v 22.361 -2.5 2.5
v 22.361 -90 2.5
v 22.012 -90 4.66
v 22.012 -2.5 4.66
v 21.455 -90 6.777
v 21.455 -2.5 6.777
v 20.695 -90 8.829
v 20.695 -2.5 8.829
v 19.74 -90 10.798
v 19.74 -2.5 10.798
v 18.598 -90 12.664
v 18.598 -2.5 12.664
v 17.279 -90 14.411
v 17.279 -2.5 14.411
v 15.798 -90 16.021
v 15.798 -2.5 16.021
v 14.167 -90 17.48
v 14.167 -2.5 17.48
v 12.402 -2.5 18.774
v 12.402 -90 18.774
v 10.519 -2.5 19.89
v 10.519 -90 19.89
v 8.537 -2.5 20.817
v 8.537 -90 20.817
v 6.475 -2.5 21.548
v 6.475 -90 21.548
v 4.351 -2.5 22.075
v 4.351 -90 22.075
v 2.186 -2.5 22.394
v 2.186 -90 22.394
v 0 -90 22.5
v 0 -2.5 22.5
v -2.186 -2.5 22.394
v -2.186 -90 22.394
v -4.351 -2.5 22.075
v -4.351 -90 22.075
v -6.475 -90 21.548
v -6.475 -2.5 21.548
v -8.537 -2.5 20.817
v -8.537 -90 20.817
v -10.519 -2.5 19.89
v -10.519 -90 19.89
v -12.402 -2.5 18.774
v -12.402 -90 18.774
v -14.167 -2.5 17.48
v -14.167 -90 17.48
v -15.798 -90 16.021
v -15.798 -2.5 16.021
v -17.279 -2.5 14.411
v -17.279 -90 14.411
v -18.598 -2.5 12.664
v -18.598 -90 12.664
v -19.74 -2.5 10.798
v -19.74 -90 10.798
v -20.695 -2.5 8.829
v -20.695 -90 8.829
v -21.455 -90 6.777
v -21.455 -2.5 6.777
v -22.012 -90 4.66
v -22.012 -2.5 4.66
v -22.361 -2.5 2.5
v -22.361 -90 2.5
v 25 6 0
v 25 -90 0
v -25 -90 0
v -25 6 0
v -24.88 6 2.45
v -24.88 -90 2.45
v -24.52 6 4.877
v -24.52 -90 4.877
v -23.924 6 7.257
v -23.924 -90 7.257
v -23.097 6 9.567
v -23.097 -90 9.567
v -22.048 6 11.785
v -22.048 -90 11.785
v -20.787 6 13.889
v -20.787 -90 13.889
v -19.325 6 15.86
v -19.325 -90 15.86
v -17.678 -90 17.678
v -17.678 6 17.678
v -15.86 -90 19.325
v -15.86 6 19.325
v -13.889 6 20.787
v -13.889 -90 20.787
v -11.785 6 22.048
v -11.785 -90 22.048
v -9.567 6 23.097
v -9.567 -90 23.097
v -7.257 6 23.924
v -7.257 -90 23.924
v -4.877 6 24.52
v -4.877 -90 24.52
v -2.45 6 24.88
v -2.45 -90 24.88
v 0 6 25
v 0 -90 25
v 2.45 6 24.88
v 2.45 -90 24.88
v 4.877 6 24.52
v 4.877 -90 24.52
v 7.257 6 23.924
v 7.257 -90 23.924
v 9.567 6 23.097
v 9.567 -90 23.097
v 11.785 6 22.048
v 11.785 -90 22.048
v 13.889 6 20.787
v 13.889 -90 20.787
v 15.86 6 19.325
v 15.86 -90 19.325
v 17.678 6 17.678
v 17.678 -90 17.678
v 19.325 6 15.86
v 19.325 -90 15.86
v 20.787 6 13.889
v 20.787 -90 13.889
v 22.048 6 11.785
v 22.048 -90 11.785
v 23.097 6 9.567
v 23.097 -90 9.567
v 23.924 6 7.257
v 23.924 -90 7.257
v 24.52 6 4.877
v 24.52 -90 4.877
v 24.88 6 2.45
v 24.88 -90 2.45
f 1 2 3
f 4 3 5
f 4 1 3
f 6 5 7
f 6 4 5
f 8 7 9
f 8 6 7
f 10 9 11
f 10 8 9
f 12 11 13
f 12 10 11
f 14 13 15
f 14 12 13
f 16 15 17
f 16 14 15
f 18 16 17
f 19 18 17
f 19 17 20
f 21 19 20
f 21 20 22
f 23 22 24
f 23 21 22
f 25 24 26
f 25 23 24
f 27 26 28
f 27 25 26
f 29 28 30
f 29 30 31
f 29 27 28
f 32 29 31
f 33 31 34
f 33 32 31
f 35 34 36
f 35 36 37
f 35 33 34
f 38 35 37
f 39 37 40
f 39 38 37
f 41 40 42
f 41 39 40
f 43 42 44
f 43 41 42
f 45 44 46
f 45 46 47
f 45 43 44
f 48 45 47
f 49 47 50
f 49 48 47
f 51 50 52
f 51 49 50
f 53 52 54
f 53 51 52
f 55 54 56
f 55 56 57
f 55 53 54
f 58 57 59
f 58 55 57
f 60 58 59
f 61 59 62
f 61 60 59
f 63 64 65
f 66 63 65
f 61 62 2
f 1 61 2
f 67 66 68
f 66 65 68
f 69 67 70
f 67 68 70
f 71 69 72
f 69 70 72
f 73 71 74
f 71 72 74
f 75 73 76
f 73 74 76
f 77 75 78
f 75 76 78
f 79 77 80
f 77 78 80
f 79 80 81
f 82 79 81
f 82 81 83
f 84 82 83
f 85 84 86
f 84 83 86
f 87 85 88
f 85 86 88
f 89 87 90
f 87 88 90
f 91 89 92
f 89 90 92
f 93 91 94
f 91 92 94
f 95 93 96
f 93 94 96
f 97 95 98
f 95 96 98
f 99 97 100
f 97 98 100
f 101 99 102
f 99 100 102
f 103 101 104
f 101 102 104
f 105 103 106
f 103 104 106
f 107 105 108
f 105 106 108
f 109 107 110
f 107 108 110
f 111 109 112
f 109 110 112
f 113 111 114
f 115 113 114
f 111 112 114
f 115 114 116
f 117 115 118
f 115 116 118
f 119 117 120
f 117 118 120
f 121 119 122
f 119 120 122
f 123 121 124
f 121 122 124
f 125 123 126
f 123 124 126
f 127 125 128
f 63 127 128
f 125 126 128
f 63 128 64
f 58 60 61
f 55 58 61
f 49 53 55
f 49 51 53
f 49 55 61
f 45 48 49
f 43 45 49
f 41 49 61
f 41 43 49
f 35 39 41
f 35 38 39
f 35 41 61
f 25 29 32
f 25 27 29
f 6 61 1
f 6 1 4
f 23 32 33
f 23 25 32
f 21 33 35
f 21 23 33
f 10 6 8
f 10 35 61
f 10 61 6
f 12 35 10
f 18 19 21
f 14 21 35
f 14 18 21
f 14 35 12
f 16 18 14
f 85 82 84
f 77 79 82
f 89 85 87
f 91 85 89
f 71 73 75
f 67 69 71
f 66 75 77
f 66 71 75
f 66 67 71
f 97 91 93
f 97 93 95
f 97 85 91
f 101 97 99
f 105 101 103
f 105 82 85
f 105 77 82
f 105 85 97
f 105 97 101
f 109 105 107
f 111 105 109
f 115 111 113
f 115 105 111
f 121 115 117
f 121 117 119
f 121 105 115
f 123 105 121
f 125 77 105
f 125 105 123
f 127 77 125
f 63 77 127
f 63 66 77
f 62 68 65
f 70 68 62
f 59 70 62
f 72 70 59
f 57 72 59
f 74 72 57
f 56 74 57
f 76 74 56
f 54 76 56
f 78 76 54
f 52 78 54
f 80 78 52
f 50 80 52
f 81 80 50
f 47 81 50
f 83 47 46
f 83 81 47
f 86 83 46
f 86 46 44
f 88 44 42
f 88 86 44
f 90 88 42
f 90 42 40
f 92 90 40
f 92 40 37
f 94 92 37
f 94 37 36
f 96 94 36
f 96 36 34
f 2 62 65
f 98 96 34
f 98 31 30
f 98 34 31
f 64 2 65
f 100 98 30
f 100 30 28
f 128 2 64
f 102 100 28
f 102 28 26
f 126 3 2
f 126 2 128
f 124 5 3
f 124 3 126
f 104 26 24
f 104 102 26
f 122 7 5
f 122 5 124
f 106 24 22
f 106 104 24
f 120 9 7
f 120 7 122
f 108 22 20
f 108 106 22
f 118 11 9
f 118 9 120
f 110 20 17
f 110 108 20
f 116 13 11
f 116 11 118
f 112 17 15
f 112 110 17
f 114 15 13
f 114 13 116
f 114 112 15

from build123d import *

# Parameters (mm, degrees)
F1_DEPTH = 90
F2_T     = -2.5
F3_DEPTH = 6
F5_DEPTH = 50


with BuildPart() as f1:
    # F0 (on Front) → F1 (new body)
    with BuildSketch(Plane.XZ):
        with BuildLine():
            Line((-25, 0), (25, 0))
            ThreePointArc((25, 0), (0, 25), (-25, 0))
        make_face()
    extrude(amount=F1_DEPTH)

    # F2
    f2_openings = [f1.faces().sort_by_distance(p)[0] for p in [
        (0, -90, 10.61033),
    ]]
    offset(amount=F2_T, openings=f2_openings)

    # F1_face (on face) → F3 (join)
    with BuildSketch(Plane(origin=(0, 0, 10.61033), x_dir=(1, 0, 0), z_dir=(0, 1, 0))):
        with BuildLine():
            Line((25, 10.61033), (-25, 10.61033))
            ThreePointArc((-25, 10.61033), (0, -14.38967), (25, 10.61033))
        make_face()
    extrude(amount=F3_DEPTH)

    # F4 (on Right) → F5 (cut, symmetric)
    with BuildSketch(Plane.YZ):
        Polygon((6, 47.765567), (6, 9.95), (8, 11.104701), (8, 47.765567), align=None)
        Polygon((8, -11.104701), (6, -9.95), (6, -25.27874), (8, -25.27874), align=None)
    extrude(amount=F5_DEPTH, both=True, mode=Mode.SUBTRACT)


solid = f1.part
